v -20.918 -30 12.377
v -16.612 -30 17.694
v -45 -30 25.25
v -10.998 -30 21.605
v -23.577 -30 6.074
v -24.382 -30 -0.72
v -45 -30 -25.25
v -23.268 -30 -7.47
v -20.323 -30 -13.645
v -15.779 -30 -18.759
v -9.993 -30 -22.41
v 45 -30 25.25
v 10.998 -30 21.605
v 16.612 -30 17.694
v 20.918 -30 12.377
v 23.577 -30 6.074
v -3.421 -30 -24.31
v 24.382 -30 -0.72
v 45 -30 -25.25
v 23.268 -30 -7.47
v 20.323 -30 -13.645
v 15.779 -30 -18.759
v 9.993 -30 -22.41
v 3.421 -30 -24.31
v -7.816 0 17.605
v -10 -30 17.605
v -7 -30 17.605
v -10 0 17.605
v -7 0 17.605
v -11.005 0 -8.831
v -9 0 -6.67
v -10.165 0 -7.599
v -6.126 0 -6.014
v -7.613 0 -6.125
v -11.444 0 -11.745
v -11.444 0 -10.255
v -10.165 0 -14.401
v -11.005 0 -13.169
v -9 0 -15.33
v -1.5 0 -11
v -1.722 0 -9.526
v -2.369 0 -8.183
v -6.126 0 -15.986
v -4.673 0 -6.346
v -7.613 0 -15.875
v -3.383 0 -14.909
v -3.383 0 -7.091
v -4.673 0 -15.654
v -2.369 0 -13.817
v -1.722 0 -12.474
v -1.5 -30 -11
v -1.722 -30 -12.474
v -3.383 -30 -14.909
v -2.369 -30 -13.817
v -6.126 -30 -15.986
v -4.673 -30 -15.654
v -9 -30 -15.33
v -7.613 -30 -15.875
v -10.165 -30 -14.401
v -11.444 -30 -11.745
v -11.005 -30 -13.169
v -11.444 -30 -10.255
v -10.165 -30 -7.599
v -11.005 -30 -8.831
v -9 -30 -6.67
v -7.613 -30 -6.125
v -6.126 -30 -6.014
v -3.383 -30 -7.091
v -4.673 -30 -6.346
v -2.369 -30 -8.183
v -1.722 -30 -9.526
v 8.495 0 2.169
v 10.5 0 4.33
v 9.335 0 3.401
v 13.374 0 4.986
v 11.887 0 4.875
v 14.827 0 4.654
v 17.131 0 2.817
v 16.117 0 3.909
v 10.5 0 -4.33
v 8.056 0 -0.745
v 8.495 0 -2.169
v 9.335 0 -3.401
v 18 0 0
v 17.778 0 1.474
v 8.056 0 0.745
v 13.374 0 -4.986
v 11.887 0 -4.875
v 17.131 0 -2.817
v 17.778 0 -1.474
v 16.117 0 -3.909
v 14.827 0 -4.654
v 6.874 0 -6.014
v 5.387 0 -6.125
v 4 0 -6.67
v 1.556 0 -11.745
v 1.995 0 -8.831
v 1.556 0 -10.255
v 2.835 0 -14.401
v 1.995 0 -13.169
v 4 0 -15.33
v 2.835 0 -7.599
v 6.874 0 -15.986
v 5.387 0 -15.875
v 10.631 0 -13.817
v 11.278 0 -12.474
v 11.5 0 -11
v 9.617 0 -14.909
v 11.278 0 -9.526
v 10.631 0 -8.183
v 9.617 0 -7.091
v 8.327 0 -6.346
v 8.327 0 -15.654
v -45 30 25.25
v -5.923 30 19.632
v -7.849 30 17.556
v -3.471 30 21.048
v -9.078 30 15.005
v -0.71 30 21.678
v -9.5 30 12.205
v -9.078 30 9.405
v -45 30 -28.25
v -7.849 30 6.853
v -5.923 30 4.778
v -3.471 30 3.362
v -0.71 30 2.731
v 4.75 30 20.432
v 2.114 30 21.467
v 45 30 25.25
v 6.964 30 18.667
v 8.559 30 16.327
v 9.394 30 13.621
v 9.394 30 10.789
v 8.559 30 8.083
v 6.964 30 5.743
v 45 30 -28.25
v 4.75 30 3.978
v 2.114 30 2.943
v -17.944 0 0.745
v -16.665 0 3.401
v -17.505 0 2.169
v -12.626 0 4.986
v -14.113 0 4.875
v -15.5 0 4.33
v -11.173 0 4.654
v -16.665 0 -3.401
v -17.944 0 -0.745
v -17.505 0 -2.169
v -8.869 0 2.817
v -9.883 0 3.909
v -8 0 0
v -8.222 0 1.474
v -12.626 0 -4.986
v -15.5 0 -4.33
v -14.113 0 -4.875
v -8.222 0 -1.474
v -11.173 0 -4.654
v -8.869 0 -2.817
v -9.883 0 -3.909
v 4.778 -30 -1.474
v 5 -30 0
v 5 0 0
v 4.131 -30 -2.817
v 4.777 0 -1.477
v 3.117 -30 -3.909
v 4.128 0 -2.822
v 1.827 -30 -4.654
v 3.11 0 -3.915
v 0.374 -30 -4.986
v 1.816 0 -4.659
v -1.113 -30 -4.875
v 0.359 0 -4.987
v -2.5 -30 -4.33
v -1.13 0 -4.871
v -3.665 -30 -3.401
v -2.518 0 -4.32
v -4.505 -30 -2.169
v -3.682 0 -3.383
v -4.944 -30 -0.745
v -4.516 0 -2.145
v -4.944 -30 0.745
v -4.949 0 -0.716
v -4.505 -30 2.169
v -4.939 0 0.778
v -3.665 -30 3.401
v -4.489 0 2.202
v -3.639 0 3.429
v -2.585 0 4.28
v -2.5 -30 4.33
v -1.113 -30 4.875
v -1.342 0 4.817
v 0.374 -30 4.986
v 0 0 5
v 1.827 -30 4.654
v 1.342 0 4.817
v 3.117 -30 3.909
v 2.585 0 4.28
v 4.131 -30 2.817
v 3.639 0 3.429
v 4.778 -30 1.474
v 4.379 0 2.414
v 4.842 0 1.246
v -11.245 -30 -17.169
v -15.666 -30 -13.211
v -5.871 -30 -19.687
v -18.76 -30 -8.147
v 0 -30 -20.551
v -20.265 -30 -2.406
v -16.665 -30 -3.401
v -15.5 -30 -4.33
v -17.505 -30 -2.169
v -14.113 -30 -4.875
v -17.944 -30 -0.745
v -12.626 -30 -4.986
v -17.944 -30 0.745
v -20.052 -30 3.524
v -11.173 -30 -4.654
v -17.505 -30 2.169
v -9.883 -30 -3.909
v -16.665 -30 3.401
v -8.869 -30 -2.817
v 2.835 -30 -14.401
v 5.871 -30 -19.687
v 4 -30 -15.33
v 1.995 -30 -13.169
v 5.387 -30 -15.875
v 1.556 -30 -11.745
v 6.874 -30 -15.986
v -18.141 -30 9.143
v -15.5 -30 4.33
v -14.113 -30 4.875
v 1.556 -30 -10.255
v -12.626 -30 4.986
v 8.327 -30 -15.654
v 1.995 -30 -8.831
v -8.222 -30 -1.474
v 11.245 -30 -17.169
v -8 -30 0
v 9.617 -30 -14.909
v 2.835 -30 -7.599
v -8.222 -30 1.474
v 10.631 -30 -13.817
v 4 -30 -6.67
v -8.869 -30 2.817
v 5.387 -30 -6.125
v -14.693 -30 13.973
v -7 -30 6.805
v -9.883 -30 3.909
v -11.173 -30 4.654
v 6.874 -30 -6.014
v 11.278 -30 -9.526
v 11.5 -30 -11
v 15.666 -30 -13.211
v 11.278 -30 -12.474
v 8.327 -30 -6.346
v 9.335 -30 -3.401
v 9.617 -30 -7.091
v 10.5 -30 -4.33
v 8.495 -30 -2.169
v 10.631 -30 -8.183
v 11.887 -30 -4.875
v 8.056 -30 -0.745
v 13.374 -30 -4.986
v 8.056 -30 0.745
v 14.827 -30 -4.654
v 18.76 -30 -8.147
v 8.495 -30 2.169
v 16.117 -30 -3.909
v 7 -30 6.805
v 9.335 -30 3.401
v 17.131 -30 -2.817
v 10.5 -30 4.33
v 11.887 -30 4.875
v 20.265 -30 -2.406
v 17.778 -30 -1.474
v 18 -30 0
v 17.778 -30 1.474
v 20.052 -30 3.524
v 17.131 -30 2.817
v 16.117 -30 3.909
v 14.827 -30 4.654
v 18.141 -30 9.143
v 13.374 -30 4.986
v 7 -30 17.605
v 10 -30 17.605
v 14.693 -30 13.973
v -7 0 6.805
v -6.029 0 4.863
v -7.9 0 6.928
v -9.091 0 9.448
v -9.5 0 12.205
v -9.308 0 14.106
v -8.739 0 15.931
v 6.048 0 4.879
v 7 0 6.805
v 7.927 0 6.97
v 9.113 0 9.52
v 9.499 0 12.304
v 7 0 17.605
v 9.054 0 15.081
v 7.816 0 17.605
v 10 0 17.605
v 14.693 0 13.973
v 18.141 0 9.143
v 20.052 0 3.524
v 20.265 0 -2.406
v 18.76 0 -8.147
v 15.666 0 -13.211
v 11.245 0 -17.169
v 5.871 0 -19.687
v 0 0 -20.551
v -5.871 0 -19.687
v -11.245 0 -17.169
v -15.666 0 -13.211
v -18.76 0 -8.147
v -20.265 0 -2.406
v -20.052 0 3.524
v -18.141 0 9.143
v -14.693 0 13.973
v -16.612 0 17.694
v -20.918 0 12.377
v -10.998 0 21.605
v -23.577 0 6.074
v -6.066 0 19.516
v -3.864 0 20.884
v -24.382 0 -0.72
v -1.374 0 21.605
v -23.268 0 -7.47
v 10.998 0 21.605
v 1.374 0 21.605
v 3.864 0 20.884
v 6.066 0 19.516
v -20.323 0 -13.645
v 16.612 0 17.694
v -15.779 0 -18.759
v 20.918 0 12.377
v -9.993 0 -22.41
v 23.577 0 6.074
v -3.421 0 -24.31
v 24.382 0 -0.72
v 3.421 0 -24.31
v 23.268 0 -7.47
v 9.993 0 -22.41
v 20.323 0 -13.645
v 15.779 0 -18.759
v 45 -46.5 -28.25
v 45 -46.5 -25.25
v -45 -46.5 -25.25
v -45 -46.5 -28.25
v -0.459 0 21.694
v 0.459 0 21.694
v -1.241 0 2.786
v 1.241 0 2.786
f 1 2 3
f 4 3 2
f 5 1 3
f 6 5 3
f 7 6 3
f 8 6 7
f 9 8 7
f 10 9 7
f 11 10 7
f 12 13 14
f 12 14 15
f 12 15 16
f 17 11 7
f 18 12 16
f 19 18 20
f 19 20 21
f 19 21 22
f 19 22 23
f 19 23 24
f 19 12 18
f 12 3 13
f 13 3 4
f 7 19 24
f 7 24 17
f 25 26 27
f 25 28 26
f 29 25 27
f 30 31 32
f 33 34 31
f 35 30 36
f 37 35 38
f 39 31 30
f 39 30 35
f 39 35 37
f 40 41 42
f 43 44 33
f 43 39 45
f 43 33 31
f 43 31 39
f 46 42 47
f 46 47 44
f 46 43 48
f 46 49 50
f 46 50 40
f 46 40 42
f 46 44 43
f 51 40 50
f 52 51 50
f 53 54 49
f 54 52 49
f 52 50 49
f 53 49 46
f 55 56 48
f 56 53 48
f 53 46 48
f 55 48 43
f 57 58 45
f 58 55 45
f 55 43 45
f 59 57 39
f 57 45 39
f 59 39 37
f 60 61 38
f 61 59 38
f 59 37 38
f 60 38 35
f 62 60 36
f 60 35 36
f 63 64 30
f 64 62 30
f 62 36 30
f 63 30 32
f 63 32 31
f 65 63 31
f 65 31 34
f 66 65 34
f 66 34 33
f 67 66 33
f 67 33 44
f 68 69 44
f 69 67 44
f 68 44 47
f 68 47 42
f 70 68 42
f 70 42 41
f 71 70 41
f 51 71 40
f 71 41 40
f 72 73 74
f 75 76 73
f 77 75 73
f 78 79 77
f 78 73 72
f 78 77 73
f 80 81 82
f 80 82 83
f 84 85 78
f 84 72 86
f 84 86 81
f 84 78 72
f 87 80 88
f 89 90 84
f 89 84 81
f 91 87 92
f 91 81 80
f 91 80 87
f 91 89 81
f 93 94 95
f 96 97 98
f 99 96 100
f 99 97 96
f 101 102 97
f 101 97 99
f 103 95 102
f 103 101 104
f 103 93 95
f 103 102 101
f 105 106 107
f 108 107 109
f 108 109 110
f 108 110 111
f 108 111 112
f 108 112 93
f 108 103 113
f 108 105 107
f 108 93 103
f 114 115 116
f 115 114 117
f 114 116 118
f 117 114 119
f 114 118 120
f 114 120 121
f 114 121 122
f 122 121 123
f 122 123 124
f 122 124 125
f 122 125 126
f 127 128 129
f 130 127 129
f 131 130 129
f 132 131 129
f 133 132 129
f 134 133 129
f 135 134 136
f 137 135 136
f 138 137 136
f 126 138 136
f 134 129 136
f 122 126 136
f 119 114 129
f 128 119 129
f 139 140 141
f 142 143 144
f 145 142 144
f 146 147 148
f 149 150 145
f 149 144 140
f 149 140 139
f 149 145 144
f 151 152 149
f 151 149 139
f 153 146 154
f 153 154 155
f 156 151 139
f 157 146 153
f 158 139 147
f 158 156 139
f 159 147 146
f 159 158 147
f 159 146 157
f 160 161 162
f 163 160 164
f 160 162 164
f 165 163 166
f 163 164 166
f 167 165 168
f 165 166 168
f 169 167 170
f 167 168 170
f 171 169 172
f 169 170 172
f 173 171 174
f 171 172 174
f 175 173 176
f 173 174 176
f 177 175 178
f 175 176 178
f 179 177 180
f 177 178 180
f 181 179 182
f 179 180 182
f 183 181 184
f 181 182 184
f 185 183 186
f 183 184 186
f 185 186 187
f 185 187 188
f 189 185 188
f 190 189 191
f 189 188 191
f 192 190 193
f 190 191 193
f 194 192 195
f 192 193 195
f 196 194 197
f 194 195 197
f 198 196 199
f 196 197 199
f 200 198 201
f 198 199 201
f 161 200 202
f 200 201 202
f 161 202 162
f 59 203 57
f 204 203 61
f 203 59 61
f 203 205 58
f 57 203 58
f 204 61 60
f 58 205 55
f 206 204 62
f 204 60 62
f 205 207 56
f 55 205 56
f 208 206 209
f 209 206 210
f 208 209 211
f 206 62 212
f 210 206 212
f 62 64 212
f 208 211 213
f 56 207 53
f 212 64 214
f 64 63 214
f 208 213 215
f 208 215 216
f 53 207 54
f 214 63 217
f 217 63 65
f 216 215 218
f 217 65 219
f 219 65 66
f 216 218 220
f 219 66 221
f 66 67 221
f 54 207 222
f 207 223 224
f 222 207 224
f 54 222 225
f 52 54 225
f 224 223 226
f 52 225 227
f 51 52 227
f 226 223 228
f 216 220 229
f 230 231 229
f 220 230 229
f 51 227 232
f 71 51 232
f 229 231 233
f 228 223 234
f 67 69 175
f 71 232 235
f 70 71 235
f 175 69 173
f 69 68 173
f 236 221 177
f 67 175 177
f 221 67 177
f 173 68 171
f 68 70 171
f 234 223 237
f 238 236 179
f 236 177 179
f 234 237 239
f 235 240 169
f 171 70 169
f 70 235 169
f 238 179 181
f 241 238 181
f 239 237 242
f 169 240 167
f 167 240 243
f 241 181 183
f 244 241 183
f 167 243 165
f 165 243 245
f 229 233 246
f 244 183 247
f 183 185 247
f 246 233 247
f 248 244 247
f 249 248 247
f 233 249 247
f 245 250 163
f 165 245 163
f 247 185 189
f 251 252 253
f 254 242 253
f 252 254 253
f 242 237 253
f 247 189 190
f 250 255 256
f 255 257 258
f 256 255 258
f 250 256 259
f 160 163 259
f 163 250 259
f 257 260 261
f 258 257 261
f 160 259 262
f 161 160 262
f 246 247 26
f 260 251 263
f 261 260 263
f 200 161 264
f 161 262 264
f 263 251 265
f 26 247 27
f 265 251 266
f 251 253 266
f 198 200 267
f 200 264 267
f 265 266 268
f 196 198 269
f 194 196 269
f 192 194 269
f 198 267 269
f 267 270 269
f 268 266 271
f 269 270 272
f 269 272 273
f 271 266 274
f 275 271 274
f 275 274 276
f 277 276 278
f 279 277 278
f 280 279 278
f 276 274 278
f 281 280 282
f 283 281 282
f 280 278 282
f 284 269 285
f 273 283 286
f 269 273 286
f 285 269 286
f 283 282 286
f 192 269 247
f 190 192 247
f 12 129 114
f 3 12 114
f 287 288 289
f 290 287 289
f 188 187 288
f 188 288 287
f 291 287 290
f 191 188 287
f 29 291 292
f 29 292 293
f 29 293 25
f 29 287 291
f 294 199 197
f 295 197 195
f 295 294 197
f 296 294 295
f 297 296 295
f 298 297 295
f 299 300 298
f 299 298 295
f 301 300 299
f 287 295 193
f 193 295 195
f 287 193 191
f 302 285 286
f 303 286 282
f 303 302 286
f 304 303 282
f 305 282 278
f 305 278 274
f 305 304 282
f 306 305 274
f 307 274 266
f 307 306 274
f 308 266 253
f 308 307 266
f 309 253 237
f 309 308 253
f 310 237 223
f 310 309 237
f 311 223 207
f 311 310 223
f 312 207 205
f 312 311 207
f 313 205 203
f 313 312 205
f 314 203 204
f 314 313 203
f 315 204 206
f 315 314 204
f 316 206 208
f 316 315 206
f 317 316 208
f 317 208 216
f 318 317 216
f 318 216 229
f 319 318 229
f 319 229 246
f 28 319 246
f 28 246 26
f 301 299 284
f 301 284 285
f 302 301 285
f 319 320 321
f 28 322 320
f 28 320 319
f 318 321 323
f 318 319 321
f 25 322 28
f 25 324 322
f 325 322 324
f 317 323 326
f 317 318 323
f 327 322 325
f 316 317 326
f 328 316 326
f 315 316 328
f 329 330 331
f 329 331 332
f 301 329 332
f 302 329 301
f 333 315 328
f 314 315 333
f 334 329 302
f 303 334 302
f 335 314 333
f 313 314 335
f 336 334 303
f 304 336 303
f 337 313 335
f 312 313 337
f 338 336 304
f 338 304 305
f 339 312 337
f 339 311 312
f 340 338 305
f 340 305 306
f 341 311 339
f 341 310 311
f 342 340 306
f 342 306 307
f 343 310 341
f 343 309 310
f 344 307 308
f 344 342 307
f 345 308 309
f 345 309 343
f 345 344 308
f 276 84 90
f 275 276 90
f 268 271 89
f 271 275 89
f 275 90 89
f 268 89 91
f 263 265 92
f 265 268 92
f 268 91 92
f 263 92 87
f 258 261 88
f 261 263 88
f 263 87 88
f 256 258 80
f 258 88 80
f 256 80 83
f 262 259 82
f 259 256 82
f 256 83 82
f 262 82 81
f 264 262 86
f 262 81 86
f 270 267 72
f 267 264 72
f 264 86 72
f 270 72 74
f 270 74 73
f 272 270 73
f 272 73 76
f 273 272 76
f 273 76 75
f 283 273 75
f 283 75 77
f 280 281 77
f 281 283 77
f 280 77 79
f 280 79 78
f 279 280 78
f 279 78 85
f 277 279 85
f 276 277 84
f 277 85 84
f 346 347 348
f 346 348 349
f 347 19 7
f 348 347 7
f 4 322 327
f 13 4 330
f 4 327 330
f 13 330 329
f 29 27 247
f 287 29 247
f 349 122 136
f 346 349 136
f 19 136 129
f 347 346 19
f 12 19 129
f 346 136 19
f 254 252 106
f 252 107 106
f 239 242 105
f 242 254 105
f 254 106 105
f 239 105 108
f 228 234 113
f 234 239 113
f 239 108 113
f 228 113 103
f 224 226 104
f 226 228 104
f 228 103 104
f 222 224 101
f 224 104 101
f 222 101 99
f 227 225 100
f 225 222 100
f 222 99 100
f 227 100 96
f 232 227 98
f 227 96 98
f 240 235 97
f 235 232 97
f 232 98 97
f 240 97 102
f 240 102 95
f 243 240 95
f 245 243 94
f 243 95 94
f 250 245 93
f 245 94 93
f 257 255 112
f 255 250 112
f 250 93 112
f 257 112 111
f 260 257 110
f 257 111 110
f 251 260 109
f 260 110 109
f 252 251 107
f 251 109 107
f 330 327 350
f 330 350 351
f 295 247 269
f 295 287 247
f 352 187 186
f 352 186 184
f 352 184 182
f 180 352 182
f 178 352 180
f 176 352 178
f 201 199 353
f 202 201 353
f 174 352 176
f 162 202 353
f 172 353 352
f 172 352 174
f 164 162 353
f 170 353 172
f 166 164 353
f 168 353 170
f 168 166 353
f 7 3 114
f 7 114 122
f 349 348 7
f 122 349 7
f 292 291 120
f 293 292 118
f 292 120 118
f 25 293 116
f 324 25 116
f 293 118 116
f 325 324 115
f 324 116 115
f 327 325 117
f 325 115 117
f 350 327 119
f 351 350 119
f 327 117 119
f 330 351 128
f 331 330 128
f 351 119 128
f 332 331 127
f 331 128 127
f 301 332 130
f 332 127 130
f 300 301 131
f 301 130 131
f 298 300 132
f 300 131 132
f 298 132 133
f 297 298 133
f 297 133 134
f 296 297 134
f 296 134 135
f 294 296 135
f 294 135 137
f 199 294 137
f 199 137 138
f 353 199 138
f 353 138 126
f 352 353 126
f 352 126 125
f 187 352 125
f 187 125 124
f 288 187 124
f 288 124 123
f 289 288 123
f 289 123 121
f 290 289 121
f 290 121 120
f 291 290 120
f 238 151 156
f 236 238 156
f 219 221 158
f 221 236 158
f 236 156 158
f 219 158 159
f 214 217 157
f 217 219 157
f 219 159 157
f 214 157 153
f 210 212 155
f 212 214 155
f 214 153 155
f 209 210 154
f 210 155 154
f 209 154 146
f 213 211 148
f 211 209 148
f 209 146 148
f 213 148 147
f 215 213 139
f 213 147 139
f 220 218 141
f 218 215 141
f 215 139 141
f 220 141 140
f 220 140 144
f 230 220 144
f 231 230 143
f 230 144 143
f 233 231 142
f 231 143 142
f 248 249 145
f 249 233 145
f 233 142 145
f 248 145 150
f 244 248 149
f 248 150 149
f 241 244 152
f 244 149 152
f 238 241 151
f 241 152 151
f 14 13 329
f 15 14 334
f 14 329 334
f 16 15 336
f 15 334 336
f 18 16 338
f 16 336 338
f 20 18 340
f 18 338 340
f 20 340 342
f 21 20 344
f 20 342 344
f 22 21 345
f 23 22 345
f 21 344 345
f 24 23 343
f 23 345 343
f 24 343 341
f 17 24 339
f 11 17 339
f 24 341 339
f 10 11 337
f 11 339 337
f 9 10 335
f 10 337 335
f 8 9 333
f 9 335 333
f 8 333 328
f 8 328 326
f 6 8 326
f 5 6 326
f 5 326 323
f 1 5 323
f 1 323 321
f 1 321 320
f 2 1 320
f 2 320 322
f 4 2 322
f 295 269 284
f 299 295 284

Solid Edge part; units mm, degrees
sketch "Sketch1" plane through (0, 0, 0) normal (0, -1, 0) x (1, 0, 0)
  line L0 (7, 6.8049) -> (7, 17.6049)
  line L1 (7, 17.6049) -> (10, 17.6049)
  arc A0 (10, 17.6049) -> (-10, 17.6049) centre (0, -0.1626) cw
  line L2 (-10, 17.6049) -> (-7, 17.6049)
  line L3 (-7, 17.6049) -> (-7, 6.8049)
  line L4 (-7, 6.8049) -> (7, 6.8049)
  circle A1 centre (13, 0) radius 5
  circle A2 centre (0, 0) radius 5
  circle A3 centre (6.5, -11) radius 5
  circle A4 centre (-13, 0) radius 5
  circle A5 centre (-6.5, -11) radius 5
extrude "Protrusion1" add sketch "Sketch1" along normal blind 30
sketch "Sketch2" plane through (0, 0, -1.473) normal (0, 1, 0) x (-1, 0, 0)
  line L0 (0, 23.078) -> (-10.9985, 23.078)
  arc A0 (-10.9985, 23.078) -> (10.9985, 23.078) centre (0, 1.3104) ccw
  line L1 (10.9985, 23.078) -> (0, 23.078)
  line L2 (-35, 26.723) -> (35, 26.723)
  line L3 (35, 26.723) -> (35, -23.777)
  line L4 (35, -23.777) -> (-35, -23.777)
  line L5 (-35, -23.777) -> (-35, 26.723)
  dimension "D1" = 4
extrude "Protrusion2" add sketch "Sketch2" against normal blind 30
sketch "Sketch3" plane through (0, 0, 0) normal (0, -1, 0) x (1, 0, 0)
  line L0 (35, 25.25) -> (-35, 25.25)
  line L1 (-35, 25.25) -> (-35, -25.25)
  line L2 (-35, -25.25) -> (35, -25.25)
  line L3 (35, -25.25) -> (35, 25.25)
extrude "Protrusion3" add sketch "Sketch3" against normal blind 30
sketch "Sketch4" plane through (0, 30, 0) normal (0, 1, 0) x (-1, 0, 0)
  circle A0 centre (0, 12.2049) radius 9.5
extrude "Cutout1" cut sketch "Sketch4" against normal blind 30
sketch "Sketch5" plane through (0, 30, 0) normal (0, 1, 0) x (-1, 0, 0)
  line L0 (35, -28.25) -> (-35, -28.25)
  line L1 (-35, -28.25) -> (-35, -25.25)
  line L2 (-35, -25.25) -> (35, -25.25)
  line L3 (35, -25.25) -> (35, -28.25)
extrude "Protrusion4" add sketch "Sketch5" against normal blind 76.5
sketch "Sketch6" plane through (35, -8.25, -1.5) normal (1, 0, 0) x (0, 1, 0)
  line L0 (-21.75, 26.75) -> (-21.75, -23.75)
  line L1 (-21.75, -23.75) -> (-38.25, -23.75)
  line L2 (-38.25, -23.75) -> (-38.25, -26.75)
  line L3 (-38.25, -26.75) -> (38.25, -26.75)
  line L4 (38.25, -26.75) -> (38.25, 26.75)
  line L5 (38.25, 26.75) -> (-21.75, 26.75)
extrude "Protrusion5" add sketch "Sketch6" along normal blind 10
sketch "Sketch7" plane through (-35, -8.25, -1.5) normal (-1, 0, 0) x (0, -1, 0)
  line L0 (21.75, -23.75) -> (21.75, 26.75)
  line L1 (21.75, 26.75) -> (-38.25, 26.75)
  line L2 (-38.25, 26.75) -> (-38.25, -26.75)
  line L3 (-38.25, -26.75) -> (38.25, -26.75)
  line L4 (38.25, -26.75) -> (38.25, -23.75)
  line L5 (38.25, -23.75) -> (21.75, -23.75)
extrude "Protrusion6" add sketch "Sketch7" along normal blind 10
